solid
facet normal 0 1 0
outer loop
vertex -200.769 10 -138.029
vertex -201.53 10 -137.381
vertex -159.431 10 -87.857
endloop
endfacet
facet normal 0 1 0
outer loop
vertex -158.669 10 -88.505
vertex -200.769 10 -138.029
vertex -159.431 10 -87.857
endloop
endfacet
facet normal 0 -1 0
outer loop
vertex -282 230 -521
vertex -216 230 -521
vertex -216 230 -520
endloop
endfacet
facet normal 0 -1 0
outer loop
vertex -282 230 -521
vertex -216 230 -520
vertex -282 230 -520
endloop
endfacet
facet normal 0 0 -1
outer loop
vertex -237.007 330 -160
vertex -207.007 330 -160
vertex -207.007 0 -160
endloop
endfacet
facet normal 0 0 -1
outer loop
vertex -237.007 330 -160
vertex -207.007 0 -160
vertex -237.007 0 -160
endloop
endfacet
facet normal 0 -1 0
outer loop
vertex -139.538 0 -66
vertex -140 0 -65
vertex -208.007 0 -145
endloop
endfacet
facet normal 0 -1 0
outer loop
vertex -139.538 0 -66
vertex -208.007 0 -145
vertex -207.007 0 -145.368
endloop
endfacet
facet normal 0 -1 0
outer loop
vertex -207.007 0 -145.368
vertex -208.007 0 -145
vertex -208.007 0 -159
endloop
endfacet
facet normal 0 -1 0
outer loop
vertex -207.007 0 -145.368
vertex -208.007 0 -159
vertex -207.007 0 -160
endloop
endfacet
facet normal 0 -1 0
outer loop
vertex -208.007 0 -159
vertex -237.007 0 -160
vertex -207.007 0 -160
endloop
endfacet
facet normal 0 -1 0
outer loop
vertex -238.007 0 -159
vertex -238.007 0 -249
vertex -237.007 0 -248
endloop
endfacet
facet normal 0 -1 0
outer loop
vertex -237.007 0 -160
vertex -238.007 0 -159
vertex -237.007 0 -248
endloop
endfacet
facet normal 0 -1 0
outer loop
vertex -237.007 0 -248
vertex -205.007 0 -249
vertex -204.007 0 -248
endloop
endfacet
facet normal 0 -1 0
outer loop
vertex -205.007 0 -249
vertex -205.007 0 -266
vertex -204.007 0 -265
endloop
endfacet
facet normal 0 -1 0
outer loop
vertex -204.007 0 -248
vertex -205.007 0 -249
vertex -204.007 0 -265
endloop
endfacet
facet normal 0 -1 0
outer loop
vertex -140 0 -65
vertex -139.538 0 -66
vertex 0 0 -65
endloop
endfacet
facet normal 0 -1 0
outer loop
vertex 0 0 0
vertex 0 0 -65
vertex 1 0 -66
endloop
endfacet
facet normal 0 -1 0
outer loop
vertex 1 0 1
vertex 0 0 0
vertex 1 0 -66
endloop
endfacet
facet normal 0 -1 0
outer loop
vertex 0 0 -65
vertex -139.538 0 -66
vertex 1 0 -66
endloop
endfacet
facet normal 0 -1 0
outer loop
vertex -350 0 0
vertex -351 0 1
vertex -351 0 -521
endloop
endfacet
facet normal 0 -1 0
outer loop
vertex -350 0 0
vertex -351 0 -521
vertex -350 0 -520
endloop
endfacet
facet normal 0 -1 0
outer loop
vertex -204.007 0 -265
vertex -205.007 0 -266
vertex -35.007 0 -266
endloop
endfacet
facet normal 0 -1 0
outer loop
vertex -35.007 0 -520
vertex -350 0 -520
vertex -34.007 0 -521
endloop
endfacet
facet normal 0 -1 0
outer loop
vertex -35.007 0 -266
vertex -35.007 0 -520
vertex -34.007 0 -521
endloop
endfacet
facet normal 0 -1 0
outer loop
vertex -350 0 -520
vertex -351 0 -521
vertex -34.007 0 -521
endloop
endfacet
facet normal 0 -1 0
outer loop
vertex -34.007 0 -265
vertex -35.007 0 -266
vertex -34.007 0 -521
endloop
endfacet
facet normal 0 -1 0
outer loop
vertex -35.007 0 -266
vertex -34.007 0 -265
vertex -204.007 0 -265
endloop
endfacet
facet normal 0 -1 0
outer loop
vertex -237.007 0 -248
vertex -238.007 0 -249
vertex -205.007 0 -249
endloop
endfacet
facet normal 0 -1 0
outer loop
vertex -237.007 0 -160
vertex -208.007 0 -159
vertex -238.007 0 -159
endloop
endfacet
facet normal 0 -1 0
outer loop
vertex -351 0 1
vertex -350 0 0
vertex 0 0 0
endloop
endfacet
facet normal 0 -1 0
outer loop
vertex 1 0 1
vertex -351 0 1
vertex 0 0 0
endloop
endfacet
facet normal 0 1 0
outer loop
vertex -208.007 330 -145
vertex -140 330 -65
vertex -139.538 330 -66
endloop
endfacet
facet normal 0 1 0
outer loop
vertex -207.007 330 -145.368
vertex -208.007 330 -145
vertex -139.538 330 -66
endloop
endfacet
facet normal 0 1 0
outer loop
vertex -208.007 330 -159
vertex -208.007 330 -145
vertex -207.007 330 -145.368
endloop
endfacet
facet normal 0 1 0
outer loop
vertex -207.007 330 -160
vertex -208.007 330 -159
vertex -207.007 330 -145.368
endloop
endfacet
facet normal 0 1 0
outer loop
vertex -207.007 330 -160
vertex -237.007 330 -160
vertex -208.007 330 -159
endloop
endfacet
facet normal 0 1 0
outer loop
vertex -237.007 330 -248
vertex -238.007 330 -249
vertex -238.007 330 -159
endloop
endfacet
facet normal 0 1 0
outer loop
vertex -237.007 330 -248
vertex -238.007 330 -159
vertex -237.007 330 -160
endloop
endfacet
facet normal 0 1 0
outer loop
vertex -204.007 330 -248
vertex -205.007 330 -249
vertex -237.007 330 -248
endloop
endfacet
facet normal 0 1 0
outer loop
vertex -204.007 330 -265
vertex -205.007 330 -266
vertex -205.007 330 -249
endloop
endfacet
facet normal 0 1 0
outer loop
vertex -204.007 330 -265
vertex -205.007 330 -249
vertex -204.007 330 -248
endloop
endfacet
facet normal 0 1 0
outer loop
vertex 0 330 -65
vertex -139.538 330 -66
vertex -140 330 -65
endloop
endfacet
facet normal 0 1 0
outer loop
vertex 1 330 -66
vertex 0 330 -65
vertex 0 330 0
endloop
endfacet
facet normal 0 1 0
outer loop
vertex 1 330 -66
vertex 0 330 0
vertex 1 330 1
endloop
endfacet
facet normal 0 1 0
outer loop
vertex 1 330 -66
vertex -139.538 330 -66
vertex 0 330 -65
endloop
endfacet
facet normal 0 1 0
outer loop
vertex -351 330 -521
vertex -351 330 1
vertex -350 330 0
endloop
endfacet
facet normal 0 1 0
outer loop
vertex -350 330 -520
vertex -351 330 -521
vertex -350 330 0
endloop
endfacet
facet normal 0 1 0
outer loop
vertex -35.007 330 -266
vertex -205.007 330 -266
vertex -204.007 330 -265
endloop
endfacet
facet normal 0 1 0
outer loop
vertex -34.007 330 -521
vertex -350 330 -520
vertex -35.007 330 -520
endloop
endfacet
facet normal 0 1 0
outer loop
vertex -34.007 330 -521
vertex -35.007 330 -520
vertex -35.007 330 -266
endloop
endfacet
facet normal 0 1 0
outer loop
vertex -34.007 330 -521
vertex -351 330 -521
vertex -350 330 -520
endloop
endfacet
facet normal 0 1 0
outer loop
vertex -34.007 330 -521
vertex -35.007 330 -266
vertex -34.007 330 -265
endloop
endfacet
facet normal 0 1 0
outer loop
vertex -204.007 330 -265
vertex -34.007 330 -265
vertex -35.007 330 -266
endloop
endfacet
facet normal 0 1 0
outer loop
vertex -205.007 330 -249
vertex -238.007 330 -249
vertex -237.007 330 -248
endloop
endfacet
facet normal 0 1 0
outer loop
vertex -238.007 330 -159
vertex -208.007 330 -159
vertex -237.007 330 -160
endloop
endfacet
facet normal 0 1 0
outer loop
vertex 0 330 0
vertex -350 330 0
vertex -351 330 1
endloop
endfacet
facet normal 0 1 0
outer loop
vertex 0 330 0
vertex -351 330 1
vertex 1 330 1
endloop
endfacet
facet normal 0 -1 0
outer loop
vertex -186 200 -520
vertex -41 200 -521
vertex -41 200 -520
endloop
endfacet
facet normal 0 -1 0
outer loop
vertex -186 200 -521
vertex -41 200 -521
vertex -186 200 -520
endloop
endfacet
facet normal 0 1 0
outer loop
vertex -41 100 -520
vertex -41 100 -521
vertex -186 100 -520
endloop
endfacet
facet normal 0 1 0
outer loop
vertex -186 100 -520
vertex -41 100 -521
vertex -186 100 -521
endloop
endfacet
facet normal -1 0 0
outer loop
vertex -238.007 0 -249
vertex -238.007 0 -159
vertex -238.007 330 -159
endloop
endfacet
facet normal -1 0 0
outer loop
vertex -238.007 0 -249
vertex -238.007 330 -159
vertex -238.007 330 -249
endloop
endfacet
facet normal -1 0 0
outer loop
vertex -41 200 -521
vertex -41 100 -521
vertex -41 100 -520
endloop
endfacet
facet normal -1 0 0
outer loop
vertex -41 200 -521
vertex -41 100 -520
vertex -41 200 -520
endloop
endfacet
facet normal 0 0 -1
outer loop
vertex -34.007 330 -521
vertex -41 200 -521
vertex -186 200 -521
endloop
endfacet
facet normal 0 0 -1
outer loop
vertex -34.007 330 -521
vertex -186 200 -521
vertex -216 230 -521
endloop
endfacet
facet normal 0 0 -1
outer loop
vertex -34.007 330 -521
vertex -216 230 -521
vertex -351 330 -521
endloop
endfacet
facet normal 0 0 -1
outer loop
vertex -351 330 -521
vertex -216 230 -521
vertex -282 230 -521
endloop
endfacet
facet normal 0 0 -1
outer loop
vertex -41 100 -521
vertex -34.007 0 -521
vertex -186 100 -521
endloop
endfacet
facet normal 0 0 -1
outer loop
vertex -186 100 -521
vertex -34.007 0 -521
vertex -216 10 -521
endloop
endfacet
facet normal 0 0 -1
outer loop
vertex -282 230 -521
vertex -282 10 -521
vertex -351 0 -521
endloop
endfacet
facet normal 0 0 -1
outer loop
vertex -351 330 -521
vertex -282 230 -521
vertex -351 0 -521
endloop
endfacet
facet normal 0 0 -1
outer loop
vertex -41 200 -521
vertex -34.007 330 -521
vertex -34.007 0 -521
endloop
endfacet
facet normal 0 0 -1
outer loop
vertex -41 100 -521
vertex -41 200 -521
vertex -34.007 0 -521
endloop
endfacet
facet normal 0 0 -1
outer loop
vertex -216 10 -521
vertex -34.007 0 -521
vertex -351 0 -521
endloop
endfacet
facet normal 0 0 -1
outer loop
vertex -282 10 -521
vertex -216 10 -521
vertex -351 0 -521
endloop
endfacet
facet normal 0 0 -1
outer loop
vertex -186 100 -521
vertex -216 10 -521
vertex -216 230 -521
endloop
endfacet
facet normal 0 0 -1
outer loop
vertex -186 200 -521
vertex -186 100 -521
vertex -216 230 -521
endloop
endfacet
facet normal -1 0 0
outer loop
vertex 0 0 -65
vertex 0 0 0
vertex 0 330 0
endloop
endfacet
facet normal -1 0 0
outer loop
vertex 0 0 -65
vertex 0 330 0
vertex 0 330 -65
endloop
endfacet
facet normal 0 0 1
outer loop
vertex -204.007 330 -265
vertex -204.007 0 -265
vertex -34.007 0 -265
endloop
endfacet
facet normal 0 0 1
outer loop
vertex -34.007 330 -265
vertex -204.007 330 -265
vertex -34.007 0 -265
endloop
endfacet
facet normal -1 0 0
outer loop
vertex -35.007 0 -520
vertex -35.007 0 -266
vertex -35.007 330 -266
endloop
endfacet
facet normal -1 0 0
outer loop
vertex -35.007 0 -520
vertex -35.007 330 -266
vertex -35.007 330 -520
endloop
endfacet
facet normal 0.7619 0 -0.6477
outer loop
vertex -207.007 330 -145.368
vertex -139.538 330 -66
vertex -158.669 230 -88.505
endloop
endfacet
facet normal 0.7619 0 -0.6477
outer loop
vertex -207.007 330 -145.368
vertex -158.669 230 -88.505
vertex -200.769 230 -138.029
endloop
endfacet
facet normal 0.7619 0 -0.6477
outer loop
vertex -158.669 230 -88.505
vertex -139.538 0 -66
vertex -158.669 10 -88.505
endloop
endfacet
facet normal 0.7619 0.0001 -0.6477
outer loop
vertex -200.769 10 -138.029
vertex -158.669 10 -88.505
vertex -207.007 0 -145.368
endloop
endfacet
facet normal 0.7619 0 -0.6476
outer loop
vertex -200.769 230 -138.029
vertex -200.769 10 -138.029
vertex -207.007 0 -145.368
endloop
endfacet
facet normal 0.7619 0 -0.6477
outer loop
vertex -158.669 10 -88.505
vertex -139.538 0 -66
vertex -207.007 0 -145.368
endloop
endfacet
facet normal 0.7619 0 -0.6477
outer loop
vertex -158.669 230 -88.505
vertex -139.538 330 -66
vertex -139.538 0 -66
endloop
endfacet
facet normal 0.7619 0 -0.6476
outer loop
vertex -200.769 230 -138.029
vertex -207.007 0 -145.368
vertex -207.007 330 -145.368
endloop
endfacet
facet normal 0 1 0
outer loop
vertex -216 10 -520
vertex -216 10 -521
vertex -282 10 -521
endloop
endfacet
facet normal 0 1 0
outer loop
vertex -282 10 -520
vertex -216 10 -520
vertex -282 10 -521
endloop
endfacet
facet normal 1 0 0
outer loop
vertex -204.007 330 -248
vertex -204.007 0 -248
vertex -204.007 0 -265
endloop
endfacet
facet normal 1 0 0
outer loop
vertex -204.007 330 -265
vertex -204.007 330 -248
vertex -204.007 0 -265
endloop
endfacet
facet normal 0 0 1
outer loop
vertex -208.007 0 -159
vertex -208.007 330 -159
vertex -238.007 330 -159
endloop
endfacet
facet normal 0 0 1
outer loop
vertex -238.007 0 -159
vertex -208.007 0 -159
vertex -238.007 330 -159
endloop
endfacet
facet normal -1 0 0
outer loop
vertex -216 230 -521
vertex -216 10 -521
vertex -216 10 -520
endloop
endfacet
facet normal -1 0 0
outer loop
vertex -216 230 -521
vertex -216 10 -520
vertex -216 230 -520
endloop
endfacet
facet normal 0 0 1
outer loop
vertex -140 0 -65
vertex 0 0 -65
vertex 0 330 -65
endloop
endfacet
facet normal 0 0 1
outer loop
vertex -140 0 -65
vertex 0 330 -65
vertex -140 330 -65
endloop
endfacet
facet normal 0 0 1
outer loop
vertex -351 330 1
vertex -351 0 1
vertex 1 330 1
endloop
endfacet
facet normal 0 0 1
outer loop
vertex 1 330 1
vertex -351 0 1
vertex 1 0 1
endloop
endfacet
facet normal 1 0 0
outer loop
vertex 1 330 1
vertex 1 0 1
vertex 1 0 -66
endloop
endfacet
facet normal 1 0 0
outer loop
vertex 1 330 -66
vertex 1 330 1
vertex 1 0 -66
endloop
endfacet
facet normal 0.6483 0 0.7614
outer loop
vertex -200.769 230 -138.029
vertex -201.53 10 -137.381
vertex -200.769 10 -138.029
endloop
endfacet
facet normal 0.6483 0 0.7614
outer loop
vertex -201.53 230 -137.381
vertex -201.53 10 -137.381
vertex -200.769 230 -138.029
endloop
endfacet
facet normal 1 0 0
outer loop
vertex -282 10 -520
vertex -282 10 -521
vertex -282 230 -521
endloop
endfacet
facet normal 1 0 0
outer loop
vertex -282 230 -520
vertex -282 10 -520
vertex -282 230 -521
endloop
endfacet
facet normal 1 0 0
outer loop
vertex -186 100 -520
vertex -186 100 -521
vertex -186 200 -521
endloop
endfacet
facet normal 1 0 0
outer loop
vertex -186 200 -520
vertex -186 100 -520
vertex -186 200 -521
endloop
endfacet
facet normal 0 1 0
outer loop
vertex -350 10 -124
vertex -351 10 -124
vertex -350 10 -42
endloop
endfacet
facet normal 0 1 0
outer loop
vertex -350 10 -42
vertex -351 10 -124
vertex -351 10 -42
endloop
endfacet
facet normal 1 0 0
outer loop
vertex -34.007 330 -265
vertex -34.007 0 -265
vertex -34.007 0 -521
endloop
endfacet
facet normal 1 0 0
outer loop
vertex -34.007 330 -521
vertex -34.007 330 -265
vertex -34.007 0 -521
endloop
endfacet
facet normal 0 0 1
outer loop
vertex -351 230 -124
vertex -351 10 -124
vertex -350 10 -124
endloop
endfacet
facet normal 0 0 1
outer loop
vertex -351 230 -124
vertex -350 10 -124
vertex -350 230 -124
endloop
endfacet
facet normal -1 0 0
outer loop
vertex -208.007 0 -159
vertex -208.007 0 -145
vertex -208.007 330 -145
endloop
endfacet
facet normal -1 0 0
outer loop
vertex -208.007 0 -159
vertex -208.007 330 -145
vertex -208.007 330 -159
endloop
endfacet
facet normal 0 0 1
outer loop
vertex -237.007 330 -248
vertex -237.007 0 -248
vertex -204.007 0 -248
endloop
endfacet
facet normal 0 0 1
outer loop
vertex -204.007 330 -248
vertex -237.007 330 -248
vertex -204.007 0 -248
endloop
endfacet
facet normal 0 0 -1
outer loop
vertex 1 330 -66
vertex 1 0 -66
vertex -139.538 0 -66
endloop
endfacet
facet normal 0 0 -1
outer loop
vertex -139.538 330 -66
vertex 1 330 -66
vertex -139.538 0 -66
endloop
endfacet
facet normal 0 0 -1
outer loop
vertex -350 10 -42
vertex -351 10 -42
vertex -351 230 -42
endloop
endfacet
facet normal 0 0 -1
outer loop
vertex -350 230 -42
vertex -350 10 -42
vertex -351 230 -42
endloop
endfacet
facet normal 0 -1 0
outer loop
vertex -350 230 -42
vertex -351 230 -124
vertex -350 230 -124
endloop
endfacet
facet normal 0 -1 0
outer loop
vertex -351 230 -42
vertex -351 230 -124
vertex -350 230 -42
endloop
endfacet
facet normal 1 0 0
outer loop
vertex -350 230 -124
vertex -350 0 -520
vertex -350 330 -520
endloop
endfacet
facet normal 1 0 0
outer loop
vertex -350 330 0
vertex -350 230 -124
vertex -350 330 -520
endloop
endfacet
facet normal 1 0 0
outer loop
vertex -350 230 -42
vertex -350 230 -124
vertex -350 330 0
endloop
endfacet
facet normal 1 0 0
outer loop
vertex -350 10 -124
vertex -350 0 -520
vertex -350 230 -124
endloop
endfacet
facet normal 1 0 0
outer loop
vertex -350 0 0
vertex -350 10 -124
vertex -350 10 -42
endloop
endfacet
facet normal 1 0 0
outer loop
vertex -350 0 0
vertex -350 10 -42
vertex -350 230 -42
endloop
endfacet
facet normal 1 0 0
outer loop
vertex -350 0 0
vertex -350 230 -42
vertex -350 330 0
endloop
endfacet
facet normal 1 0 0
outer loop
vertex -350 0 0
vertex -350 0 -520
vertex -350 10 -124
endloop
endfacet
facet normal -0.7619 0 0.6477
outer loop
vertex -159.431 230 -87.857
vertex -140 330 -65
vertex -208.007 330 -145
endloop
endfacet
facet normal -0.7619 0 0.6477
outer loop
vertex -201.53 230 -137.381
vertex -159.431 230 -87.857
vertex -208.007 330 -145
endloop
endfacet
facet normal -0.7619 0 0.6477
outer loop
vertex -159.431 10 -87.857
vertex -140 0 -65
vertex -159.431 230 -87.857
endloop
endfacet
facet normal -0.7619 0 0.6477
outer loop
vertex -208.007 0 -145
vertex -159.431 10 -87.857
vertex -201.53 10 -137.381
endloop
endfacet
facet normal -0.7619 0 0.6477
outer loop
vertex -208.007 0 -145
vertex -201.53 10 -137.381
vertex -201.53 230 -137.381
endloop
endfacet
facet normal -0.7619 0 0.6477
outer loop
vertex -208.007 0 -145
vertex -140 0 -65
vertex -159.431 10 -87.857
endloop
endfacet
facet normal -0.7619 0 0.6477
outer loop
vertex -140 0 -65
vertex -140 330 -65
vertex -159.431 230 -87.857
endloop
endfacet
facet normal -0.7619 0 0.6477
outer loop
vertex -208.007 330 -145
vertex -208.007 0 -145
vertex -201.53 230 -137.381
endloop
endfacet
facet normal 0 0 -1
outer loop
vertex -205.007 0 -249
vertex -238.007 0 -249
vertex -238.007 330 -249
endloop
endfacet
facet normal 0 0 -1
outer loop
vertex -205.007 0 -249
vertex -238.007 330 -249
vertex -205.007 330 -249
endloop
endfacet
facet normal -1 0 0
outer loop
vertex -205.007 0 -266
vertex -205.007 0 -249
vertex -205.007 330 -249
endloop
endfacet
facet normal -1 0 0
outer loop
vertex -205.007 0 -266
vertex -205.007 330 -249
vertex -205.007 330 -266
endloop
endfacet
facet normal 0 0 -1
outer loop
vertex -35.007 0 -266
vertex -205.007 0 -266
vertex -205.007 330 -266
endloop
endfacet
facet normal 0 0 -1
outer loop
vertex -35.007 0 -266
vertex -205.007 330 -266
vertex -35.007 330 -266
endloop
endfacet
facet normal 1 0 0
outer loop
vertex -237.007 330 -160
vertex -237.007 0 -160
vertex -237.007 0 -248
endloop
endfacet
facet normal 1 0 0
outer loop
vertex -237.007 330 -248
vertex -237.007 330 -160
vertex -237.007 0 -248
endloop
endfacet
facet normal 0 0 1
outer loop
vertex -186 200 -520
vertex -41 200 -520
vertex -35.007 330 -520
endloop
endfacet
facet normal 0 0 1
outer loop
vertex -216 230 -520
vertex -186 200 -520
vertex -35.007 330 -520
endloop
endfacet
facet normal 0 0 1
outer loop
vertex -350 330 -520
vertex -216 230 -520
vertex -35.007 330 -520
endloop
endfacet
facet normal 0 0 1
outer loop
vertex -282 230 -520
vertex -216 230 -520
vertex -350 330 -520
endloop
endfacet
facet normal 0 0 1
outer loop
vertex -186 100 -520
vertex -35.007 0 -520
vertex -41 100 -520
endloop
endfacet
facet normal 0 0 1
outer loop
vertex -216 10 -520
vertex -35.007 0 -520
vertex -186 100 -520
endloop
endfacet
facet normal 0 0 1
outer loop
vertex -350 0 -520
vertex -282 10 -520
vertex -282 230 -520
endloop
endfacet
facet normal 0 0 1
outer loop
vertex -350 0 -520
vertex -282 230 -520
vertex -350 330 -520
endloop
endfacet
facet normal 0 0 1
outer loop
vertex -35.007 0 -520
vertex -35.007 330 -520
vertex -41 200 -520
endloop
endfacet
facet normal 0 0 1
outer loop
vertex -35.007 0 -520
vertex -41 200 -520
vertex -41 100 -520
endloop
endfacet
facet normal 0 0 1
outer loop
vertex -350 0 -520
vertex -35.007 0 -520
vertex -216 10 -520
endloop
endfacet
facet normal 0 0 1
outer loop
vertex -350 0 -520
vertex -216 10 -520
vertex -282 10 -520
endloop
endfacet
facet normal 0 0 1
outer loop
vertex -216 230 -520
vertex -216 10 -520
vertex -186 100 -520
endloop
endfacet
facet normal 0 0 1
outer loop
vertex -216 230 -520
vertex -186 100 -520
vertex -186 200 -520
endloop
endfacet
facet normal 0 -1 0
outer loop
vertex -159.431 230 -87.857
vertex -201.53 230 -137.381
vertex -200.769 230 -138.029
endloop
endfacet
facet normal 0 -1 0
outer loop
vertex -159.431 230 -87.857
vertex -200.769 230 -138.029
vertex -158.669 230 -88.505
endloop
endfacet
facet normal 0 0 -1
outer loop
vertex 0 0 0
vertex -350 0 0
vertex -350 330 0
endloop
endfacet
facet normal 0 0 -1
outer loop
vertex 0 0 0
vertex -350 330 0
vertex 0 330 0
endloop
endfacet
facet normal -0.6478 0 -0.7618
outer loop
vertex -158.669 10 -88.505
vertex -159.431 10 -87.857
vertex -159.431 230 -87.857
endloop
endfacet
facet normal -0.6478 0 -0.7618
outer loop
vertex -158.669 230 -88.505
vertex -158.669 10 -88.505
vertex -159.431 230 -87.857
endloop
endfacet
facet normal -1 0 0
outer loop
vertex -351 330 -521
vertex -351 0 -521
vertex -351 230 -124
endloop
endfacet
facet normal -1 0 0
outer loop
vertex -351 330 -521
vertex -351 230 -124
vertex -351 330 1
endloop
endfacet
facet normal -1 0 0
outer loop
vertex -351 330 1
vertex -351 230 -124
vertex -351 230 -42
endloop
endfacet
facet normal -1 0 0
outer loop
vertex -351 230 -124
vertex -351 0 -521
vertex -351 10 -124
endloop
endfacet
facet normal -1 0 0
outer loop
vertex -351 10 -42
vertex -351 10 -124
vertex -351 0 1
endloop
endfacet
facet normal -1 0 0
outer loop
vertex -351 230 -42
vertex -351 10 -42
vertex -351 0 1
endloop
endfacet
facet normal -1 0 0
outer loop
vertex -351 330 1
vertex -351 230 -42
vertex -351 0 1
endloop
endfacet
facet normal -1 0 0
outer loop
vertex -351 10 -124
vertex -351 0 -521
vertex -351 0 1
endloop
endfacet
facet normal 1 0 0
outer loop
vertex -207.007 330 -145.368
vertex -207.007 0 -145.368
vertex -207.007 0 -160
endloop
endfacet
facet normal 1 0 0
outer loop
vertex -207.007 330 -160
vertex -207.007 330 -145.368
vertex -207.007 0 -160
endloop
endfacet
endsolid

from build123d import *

# Parameters (mm, degrees)
EXTRUDE_2_DEPTH     = 330
SKETCH_2_W          = 66
SKETCH_2_H          = 220
SKETCH_2_W_2        = 145
SKETCH_2_H_2        = 100
CUT_EXTRUDE_1_DEPTH = 10
SKETCH_5_W          = 82
SKETCH_5_H          = 220
CUT_EXTRUDE_3_DEPTH = 10
SKETCH_9_W          = 65
SKETCH_9_H          = 220
CUT_EXTRUDE_5_DEPTH = 10


with BuildPart() as part:
    # Эскиз1 → Вытянуть-Тонкостенный2 (new body)
    with BuildSketch(Plane(origin=(0, 0, 0), x_dir=(1, 0, 0), z_dir=(0, 1, 0))):
        Polygon((-34.007352544, 521), (-351, 521), (-351, -1), (1, -1), (1, 66), (-139.537591907, 66), (-207.007352544, 145.367607311), (-207.007352544, 160), (-237.007352544, 160), (-237.007352544, 248), (-204.007352544, 248), (-204.007352544, 265), (-34.007352544, 265), align=None)
        Polygon((-35.007352544, 520), (-350, 520), (-350, 0), (0, 0), (0, 65), (-140, 65), (-208.007352544, 145), (-208.007352544, 159), (-238.007352544, 159), (-238.007352544, 249), (-205.007352544, 249), (-205.007352544, 266), (-35.007352544, 266), align=None, mode=Mode.SUBTRACT)
    extrude(amount=EXTRUDE_2_DEPTH)

    # Эскиз2 → Вырез-Вытянуть1 (cut)
    with BuildSketch(Plane(origin=(0, 0, -521), x_dir=(-1, 0, 0), z_dir=(0, 0, -1))):
        with Locations((249, 120)):
            Rectangle(SKETCH_2_W, SKETCH_2_H)
        with Locations((113.5, 150)):
            Rectangle(SKETCH_2_W_2, SKETCH_2_H_2)
    extrude(amount=-CUT_EXTRUDE_1_DEPTH, mode=Mode.SUBTRACT)

    # Эскиз5 → Вырез-Вытянуть3 (cut)
    with BuildSketch(Plane.ZY.offset(351)):
        with Locations((-83, 120)):
            Rectangle(SKETCH_5_W, SKETCH_5_H)
    extrude(amount=-CUT_EXTRUDE_3_DEPTH, mode=Mode.SUBTRACT)

    # Эскиз9 → Вырез-Вытянуть5 (cut)
    with BuildSketch(Plane(origin=(-49.193811045, 0, 41.819260634), x_dir=(0.6476890718445449, 0, 0.7619047619047621), z_dir=(-0.7619047619047621, 0, 0.6476890718445449))):
        with Locations((-202.700279582, 120)):
            Rectangle(SKETCH_9_W, SKETCH_9_H)
    extrude(amount=-CUT_EXTRUDE_5_DEPTH, mode=Mode.SUBTRACT)


solid = part.part
